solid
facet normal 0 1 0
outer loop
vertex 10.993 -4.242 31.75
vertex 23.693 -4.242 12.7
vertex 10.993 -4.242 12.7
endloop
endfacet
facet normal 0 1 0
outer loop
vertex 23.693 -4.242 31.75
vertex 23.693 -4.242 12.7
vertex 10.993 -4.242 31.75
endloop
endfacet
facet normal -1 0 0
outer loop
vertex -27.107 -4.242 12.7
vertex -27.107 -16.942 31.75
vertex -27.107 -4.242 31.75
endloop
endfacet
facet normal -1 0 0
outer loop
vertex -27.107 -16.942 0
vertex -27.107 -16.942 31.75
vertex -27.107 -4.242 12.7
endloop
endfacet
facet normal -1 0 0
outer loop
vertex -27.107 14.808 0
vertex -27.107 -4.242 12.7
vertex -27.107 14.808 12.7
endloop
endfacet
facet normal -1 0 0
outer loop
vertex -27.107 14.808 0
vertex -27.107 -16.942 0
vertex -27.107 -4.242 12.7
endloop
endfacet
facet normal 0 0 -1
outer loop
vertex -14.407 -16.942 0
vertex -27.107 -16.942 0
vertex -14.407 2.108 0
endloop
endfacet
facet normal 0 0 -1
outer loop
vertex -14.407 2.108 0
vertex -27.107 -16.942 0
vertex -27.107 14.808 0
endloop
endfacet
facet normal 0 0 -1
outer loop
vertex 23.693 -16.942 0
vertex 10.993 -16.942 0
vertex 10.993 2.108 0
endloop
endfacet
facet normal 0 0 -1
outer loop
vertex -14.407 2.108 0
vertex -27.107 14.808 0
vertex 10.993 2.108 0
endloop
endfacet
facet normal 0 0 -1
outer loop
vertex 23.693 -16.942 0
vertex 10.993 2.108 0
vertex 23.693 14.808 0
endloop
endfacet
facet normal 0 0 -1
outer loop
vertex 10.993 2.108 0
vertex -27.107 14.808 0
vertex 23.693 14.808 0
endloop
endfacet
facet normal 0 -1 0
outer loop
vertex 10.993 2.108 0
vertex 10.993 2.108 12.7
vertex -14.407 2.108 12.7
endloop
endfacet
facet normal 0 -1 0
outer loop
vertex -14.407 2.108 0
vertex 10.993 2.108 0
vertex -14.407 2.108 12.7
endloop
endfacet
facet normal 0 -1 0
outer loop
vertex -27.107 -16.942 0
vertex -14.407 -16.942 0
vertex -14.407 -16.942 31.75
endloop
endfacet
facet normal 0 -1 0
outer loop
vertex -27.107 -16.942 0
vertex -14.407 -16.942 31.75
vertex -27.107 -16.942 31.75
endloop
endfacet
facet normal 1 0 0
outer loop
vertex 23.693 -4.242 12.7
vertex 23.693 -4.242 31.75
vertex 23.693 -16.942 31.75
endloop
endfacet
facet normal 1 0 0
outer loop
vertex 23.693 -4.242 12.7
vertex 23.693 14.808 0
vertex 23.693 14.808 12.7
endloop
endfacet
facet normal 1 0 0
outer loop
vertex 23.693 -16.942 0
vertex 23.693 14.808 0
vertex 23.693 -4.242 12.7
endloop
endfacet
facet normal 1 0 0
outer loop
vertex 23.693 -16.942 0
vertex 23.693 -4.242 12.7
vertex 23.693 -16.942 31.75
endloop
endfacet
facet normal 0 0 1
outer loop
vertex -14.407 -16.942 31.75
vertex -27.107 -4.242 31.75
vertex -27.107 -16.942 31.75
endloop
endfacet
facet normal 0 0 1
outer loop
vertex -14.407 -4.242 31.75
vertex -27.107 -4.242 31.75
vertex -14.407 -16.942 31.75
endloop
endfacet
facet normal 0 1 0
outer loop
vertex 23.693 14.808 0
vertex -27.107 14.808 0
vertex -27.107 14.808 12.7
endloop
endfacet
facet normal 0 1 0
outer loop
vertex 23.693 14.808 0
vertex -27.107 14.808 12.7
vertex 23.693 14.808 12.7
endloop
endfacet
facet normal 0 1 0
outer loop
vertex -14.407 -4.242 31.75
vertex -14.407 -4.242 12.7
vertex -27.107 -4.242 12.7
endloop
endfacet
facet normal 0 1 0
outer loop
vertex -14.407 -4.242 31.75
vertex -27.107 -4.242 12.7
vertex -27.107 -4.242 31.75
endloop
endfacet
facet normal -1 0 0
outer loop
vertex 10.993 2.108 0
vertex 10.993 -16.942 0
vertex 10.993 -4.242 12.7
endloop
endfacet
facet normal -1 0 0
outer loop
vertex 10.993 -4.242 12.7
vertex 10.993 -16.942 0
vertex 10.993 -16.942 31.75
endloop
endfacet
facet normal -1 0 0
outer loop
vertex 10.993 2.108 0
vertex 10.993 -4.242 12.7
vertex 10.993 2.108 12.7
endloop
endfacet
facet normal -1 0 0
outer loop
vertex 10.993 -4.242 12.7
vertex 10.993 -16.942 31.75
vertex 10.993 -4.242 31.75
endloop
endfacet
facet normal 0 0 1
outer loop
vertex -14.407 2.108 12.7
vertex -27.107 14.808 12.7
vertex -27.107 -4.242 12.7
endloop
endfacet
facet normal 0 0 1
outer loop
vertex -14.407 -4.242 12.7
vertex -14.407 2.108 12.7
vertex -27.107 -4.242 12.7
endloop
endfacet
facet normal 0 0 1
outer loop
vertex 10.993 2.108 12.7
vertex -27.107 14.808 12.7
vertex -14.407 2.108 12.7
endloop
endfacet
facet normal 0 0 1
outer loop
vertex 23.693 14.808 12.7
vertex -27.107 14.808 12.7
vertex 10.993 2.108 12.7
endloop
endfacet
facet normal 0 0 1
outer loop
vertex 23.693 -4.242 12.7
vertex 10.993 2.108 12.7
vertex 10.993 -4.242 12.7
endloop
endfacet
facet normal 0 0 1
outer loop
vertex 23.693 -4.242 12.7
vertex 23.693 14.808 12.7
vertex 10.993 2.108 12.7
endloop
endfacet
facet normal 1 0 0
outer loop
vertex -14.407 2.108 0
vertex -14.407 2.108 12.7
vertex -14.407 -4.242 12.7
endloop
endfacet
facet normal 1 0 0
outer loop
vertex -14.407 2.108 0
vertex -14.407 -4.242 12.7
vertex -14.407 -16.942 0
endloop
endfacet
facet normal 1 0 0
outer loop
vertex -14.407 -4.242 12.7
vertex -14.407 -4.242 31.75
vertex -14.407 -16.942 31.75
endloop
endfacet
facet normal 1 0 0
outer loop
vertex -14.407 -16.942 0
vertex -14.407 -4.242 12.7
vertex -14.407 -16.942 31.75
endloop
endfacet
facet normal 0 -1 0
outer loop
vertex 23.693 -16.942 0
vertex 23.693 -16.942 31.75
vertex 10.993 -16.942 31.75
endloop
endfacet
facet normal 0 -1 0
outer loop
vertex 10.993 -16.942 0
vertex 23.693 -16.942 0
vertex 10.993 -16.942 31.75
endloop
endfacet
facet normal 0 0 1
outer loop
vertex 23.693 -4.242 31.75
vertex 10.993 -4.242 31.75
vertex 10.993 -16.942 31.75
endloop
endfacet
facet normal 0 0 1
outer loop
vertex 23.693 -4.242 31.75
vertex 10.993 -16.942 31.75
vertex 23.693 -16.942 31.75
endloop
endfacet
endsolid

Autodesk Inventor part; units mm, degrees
ref_plane "YZ Plane" through (0, 0, 0) normal (1, 0, 0) x (0, 1, 0)
ref_plane "XZ Plane" through (0, 0, 0) normal (0, 1, 0) x (-1, 0, 0)
ref_plane "XY Plane" through (0, 0, 0) normal (0, 0, 1) x (1, 0, 0)
sketch "Sketch1" plane through (0, 0, 0) normal (0, 0, 1) x (1, 0, 0)
  line L0 (-27.1073, 14.808) -> (23.6927, 14.808)
  line L1 (23.6927, 14.808) -> (23.6927, -16.942)
  line L2 (23.6927, -16.942) -> (-27.1073, -16.942)
  line L3 (-27.1073, -16.942) -> (-27.1073, 14.808)
  point P0 (0, 0)
  dimension "d0" = 50.8
  dimension "d1" = 31.75
extrude "Extrusion1" add sketch "Sketch1" along normal blind 31.75
sketch "Sketch2" plane through (0, 0, 31.75) normal (0, 0, 1) x (1, 0, 0)
  line L0 (-27.1073, -16.942) -> (23.6927, -16.942) projected
  line L1 (-14.4073, -16.942) -> (10.9927, -16.942)
  line L2 (10.9927, -16.942) -> (10.9927, 2.108)
  line L3 (10.9927, 2.108) -> (-14.4073, 2.108)
  line L4 (-14.4073, 2.108) -> (-14.4073, -16.942)
  line L5 (-27.1073, 14.808) -> (-27.1073, -16.942) projected
  line L6 (23.6927, -16.942) -> (23.6927, 14.808) projected
  point P0 (0, 0)
  dimension "d4" = 12.7
  dimension "d5" = 12.7
  dimension "d6" = 19.05
extrude "Extrusion2" cut sketch "Sketch2" against normal blind 31.75
sketch "Sketch3" plane through (23.6927, -16.942, 0) normal (1, 0, 0) x (0, 0, -1)
  line L0 (-31.75, 0) -> (-31.75, 31.75) projected
  line L1 (-31.75, 31.75) -> (-12.7, 31.75)
  line L2 (-12.7, 31.75) -> (-12.7, 12.7)
  line L3 (-12.7, 12.7) -> (-31.75, 12.7)
  line L4 (-31.75, 12.7) -> (-31.75, 31.75)
  point P0 (0, 16.942)
  dimension "d9" = 19.05
  dimension "d10" = 19.05
extrude "Extrusion3" cut sketch "Sketch3" against normal blind 50.8
properties part number "Figure 7_27_5"
